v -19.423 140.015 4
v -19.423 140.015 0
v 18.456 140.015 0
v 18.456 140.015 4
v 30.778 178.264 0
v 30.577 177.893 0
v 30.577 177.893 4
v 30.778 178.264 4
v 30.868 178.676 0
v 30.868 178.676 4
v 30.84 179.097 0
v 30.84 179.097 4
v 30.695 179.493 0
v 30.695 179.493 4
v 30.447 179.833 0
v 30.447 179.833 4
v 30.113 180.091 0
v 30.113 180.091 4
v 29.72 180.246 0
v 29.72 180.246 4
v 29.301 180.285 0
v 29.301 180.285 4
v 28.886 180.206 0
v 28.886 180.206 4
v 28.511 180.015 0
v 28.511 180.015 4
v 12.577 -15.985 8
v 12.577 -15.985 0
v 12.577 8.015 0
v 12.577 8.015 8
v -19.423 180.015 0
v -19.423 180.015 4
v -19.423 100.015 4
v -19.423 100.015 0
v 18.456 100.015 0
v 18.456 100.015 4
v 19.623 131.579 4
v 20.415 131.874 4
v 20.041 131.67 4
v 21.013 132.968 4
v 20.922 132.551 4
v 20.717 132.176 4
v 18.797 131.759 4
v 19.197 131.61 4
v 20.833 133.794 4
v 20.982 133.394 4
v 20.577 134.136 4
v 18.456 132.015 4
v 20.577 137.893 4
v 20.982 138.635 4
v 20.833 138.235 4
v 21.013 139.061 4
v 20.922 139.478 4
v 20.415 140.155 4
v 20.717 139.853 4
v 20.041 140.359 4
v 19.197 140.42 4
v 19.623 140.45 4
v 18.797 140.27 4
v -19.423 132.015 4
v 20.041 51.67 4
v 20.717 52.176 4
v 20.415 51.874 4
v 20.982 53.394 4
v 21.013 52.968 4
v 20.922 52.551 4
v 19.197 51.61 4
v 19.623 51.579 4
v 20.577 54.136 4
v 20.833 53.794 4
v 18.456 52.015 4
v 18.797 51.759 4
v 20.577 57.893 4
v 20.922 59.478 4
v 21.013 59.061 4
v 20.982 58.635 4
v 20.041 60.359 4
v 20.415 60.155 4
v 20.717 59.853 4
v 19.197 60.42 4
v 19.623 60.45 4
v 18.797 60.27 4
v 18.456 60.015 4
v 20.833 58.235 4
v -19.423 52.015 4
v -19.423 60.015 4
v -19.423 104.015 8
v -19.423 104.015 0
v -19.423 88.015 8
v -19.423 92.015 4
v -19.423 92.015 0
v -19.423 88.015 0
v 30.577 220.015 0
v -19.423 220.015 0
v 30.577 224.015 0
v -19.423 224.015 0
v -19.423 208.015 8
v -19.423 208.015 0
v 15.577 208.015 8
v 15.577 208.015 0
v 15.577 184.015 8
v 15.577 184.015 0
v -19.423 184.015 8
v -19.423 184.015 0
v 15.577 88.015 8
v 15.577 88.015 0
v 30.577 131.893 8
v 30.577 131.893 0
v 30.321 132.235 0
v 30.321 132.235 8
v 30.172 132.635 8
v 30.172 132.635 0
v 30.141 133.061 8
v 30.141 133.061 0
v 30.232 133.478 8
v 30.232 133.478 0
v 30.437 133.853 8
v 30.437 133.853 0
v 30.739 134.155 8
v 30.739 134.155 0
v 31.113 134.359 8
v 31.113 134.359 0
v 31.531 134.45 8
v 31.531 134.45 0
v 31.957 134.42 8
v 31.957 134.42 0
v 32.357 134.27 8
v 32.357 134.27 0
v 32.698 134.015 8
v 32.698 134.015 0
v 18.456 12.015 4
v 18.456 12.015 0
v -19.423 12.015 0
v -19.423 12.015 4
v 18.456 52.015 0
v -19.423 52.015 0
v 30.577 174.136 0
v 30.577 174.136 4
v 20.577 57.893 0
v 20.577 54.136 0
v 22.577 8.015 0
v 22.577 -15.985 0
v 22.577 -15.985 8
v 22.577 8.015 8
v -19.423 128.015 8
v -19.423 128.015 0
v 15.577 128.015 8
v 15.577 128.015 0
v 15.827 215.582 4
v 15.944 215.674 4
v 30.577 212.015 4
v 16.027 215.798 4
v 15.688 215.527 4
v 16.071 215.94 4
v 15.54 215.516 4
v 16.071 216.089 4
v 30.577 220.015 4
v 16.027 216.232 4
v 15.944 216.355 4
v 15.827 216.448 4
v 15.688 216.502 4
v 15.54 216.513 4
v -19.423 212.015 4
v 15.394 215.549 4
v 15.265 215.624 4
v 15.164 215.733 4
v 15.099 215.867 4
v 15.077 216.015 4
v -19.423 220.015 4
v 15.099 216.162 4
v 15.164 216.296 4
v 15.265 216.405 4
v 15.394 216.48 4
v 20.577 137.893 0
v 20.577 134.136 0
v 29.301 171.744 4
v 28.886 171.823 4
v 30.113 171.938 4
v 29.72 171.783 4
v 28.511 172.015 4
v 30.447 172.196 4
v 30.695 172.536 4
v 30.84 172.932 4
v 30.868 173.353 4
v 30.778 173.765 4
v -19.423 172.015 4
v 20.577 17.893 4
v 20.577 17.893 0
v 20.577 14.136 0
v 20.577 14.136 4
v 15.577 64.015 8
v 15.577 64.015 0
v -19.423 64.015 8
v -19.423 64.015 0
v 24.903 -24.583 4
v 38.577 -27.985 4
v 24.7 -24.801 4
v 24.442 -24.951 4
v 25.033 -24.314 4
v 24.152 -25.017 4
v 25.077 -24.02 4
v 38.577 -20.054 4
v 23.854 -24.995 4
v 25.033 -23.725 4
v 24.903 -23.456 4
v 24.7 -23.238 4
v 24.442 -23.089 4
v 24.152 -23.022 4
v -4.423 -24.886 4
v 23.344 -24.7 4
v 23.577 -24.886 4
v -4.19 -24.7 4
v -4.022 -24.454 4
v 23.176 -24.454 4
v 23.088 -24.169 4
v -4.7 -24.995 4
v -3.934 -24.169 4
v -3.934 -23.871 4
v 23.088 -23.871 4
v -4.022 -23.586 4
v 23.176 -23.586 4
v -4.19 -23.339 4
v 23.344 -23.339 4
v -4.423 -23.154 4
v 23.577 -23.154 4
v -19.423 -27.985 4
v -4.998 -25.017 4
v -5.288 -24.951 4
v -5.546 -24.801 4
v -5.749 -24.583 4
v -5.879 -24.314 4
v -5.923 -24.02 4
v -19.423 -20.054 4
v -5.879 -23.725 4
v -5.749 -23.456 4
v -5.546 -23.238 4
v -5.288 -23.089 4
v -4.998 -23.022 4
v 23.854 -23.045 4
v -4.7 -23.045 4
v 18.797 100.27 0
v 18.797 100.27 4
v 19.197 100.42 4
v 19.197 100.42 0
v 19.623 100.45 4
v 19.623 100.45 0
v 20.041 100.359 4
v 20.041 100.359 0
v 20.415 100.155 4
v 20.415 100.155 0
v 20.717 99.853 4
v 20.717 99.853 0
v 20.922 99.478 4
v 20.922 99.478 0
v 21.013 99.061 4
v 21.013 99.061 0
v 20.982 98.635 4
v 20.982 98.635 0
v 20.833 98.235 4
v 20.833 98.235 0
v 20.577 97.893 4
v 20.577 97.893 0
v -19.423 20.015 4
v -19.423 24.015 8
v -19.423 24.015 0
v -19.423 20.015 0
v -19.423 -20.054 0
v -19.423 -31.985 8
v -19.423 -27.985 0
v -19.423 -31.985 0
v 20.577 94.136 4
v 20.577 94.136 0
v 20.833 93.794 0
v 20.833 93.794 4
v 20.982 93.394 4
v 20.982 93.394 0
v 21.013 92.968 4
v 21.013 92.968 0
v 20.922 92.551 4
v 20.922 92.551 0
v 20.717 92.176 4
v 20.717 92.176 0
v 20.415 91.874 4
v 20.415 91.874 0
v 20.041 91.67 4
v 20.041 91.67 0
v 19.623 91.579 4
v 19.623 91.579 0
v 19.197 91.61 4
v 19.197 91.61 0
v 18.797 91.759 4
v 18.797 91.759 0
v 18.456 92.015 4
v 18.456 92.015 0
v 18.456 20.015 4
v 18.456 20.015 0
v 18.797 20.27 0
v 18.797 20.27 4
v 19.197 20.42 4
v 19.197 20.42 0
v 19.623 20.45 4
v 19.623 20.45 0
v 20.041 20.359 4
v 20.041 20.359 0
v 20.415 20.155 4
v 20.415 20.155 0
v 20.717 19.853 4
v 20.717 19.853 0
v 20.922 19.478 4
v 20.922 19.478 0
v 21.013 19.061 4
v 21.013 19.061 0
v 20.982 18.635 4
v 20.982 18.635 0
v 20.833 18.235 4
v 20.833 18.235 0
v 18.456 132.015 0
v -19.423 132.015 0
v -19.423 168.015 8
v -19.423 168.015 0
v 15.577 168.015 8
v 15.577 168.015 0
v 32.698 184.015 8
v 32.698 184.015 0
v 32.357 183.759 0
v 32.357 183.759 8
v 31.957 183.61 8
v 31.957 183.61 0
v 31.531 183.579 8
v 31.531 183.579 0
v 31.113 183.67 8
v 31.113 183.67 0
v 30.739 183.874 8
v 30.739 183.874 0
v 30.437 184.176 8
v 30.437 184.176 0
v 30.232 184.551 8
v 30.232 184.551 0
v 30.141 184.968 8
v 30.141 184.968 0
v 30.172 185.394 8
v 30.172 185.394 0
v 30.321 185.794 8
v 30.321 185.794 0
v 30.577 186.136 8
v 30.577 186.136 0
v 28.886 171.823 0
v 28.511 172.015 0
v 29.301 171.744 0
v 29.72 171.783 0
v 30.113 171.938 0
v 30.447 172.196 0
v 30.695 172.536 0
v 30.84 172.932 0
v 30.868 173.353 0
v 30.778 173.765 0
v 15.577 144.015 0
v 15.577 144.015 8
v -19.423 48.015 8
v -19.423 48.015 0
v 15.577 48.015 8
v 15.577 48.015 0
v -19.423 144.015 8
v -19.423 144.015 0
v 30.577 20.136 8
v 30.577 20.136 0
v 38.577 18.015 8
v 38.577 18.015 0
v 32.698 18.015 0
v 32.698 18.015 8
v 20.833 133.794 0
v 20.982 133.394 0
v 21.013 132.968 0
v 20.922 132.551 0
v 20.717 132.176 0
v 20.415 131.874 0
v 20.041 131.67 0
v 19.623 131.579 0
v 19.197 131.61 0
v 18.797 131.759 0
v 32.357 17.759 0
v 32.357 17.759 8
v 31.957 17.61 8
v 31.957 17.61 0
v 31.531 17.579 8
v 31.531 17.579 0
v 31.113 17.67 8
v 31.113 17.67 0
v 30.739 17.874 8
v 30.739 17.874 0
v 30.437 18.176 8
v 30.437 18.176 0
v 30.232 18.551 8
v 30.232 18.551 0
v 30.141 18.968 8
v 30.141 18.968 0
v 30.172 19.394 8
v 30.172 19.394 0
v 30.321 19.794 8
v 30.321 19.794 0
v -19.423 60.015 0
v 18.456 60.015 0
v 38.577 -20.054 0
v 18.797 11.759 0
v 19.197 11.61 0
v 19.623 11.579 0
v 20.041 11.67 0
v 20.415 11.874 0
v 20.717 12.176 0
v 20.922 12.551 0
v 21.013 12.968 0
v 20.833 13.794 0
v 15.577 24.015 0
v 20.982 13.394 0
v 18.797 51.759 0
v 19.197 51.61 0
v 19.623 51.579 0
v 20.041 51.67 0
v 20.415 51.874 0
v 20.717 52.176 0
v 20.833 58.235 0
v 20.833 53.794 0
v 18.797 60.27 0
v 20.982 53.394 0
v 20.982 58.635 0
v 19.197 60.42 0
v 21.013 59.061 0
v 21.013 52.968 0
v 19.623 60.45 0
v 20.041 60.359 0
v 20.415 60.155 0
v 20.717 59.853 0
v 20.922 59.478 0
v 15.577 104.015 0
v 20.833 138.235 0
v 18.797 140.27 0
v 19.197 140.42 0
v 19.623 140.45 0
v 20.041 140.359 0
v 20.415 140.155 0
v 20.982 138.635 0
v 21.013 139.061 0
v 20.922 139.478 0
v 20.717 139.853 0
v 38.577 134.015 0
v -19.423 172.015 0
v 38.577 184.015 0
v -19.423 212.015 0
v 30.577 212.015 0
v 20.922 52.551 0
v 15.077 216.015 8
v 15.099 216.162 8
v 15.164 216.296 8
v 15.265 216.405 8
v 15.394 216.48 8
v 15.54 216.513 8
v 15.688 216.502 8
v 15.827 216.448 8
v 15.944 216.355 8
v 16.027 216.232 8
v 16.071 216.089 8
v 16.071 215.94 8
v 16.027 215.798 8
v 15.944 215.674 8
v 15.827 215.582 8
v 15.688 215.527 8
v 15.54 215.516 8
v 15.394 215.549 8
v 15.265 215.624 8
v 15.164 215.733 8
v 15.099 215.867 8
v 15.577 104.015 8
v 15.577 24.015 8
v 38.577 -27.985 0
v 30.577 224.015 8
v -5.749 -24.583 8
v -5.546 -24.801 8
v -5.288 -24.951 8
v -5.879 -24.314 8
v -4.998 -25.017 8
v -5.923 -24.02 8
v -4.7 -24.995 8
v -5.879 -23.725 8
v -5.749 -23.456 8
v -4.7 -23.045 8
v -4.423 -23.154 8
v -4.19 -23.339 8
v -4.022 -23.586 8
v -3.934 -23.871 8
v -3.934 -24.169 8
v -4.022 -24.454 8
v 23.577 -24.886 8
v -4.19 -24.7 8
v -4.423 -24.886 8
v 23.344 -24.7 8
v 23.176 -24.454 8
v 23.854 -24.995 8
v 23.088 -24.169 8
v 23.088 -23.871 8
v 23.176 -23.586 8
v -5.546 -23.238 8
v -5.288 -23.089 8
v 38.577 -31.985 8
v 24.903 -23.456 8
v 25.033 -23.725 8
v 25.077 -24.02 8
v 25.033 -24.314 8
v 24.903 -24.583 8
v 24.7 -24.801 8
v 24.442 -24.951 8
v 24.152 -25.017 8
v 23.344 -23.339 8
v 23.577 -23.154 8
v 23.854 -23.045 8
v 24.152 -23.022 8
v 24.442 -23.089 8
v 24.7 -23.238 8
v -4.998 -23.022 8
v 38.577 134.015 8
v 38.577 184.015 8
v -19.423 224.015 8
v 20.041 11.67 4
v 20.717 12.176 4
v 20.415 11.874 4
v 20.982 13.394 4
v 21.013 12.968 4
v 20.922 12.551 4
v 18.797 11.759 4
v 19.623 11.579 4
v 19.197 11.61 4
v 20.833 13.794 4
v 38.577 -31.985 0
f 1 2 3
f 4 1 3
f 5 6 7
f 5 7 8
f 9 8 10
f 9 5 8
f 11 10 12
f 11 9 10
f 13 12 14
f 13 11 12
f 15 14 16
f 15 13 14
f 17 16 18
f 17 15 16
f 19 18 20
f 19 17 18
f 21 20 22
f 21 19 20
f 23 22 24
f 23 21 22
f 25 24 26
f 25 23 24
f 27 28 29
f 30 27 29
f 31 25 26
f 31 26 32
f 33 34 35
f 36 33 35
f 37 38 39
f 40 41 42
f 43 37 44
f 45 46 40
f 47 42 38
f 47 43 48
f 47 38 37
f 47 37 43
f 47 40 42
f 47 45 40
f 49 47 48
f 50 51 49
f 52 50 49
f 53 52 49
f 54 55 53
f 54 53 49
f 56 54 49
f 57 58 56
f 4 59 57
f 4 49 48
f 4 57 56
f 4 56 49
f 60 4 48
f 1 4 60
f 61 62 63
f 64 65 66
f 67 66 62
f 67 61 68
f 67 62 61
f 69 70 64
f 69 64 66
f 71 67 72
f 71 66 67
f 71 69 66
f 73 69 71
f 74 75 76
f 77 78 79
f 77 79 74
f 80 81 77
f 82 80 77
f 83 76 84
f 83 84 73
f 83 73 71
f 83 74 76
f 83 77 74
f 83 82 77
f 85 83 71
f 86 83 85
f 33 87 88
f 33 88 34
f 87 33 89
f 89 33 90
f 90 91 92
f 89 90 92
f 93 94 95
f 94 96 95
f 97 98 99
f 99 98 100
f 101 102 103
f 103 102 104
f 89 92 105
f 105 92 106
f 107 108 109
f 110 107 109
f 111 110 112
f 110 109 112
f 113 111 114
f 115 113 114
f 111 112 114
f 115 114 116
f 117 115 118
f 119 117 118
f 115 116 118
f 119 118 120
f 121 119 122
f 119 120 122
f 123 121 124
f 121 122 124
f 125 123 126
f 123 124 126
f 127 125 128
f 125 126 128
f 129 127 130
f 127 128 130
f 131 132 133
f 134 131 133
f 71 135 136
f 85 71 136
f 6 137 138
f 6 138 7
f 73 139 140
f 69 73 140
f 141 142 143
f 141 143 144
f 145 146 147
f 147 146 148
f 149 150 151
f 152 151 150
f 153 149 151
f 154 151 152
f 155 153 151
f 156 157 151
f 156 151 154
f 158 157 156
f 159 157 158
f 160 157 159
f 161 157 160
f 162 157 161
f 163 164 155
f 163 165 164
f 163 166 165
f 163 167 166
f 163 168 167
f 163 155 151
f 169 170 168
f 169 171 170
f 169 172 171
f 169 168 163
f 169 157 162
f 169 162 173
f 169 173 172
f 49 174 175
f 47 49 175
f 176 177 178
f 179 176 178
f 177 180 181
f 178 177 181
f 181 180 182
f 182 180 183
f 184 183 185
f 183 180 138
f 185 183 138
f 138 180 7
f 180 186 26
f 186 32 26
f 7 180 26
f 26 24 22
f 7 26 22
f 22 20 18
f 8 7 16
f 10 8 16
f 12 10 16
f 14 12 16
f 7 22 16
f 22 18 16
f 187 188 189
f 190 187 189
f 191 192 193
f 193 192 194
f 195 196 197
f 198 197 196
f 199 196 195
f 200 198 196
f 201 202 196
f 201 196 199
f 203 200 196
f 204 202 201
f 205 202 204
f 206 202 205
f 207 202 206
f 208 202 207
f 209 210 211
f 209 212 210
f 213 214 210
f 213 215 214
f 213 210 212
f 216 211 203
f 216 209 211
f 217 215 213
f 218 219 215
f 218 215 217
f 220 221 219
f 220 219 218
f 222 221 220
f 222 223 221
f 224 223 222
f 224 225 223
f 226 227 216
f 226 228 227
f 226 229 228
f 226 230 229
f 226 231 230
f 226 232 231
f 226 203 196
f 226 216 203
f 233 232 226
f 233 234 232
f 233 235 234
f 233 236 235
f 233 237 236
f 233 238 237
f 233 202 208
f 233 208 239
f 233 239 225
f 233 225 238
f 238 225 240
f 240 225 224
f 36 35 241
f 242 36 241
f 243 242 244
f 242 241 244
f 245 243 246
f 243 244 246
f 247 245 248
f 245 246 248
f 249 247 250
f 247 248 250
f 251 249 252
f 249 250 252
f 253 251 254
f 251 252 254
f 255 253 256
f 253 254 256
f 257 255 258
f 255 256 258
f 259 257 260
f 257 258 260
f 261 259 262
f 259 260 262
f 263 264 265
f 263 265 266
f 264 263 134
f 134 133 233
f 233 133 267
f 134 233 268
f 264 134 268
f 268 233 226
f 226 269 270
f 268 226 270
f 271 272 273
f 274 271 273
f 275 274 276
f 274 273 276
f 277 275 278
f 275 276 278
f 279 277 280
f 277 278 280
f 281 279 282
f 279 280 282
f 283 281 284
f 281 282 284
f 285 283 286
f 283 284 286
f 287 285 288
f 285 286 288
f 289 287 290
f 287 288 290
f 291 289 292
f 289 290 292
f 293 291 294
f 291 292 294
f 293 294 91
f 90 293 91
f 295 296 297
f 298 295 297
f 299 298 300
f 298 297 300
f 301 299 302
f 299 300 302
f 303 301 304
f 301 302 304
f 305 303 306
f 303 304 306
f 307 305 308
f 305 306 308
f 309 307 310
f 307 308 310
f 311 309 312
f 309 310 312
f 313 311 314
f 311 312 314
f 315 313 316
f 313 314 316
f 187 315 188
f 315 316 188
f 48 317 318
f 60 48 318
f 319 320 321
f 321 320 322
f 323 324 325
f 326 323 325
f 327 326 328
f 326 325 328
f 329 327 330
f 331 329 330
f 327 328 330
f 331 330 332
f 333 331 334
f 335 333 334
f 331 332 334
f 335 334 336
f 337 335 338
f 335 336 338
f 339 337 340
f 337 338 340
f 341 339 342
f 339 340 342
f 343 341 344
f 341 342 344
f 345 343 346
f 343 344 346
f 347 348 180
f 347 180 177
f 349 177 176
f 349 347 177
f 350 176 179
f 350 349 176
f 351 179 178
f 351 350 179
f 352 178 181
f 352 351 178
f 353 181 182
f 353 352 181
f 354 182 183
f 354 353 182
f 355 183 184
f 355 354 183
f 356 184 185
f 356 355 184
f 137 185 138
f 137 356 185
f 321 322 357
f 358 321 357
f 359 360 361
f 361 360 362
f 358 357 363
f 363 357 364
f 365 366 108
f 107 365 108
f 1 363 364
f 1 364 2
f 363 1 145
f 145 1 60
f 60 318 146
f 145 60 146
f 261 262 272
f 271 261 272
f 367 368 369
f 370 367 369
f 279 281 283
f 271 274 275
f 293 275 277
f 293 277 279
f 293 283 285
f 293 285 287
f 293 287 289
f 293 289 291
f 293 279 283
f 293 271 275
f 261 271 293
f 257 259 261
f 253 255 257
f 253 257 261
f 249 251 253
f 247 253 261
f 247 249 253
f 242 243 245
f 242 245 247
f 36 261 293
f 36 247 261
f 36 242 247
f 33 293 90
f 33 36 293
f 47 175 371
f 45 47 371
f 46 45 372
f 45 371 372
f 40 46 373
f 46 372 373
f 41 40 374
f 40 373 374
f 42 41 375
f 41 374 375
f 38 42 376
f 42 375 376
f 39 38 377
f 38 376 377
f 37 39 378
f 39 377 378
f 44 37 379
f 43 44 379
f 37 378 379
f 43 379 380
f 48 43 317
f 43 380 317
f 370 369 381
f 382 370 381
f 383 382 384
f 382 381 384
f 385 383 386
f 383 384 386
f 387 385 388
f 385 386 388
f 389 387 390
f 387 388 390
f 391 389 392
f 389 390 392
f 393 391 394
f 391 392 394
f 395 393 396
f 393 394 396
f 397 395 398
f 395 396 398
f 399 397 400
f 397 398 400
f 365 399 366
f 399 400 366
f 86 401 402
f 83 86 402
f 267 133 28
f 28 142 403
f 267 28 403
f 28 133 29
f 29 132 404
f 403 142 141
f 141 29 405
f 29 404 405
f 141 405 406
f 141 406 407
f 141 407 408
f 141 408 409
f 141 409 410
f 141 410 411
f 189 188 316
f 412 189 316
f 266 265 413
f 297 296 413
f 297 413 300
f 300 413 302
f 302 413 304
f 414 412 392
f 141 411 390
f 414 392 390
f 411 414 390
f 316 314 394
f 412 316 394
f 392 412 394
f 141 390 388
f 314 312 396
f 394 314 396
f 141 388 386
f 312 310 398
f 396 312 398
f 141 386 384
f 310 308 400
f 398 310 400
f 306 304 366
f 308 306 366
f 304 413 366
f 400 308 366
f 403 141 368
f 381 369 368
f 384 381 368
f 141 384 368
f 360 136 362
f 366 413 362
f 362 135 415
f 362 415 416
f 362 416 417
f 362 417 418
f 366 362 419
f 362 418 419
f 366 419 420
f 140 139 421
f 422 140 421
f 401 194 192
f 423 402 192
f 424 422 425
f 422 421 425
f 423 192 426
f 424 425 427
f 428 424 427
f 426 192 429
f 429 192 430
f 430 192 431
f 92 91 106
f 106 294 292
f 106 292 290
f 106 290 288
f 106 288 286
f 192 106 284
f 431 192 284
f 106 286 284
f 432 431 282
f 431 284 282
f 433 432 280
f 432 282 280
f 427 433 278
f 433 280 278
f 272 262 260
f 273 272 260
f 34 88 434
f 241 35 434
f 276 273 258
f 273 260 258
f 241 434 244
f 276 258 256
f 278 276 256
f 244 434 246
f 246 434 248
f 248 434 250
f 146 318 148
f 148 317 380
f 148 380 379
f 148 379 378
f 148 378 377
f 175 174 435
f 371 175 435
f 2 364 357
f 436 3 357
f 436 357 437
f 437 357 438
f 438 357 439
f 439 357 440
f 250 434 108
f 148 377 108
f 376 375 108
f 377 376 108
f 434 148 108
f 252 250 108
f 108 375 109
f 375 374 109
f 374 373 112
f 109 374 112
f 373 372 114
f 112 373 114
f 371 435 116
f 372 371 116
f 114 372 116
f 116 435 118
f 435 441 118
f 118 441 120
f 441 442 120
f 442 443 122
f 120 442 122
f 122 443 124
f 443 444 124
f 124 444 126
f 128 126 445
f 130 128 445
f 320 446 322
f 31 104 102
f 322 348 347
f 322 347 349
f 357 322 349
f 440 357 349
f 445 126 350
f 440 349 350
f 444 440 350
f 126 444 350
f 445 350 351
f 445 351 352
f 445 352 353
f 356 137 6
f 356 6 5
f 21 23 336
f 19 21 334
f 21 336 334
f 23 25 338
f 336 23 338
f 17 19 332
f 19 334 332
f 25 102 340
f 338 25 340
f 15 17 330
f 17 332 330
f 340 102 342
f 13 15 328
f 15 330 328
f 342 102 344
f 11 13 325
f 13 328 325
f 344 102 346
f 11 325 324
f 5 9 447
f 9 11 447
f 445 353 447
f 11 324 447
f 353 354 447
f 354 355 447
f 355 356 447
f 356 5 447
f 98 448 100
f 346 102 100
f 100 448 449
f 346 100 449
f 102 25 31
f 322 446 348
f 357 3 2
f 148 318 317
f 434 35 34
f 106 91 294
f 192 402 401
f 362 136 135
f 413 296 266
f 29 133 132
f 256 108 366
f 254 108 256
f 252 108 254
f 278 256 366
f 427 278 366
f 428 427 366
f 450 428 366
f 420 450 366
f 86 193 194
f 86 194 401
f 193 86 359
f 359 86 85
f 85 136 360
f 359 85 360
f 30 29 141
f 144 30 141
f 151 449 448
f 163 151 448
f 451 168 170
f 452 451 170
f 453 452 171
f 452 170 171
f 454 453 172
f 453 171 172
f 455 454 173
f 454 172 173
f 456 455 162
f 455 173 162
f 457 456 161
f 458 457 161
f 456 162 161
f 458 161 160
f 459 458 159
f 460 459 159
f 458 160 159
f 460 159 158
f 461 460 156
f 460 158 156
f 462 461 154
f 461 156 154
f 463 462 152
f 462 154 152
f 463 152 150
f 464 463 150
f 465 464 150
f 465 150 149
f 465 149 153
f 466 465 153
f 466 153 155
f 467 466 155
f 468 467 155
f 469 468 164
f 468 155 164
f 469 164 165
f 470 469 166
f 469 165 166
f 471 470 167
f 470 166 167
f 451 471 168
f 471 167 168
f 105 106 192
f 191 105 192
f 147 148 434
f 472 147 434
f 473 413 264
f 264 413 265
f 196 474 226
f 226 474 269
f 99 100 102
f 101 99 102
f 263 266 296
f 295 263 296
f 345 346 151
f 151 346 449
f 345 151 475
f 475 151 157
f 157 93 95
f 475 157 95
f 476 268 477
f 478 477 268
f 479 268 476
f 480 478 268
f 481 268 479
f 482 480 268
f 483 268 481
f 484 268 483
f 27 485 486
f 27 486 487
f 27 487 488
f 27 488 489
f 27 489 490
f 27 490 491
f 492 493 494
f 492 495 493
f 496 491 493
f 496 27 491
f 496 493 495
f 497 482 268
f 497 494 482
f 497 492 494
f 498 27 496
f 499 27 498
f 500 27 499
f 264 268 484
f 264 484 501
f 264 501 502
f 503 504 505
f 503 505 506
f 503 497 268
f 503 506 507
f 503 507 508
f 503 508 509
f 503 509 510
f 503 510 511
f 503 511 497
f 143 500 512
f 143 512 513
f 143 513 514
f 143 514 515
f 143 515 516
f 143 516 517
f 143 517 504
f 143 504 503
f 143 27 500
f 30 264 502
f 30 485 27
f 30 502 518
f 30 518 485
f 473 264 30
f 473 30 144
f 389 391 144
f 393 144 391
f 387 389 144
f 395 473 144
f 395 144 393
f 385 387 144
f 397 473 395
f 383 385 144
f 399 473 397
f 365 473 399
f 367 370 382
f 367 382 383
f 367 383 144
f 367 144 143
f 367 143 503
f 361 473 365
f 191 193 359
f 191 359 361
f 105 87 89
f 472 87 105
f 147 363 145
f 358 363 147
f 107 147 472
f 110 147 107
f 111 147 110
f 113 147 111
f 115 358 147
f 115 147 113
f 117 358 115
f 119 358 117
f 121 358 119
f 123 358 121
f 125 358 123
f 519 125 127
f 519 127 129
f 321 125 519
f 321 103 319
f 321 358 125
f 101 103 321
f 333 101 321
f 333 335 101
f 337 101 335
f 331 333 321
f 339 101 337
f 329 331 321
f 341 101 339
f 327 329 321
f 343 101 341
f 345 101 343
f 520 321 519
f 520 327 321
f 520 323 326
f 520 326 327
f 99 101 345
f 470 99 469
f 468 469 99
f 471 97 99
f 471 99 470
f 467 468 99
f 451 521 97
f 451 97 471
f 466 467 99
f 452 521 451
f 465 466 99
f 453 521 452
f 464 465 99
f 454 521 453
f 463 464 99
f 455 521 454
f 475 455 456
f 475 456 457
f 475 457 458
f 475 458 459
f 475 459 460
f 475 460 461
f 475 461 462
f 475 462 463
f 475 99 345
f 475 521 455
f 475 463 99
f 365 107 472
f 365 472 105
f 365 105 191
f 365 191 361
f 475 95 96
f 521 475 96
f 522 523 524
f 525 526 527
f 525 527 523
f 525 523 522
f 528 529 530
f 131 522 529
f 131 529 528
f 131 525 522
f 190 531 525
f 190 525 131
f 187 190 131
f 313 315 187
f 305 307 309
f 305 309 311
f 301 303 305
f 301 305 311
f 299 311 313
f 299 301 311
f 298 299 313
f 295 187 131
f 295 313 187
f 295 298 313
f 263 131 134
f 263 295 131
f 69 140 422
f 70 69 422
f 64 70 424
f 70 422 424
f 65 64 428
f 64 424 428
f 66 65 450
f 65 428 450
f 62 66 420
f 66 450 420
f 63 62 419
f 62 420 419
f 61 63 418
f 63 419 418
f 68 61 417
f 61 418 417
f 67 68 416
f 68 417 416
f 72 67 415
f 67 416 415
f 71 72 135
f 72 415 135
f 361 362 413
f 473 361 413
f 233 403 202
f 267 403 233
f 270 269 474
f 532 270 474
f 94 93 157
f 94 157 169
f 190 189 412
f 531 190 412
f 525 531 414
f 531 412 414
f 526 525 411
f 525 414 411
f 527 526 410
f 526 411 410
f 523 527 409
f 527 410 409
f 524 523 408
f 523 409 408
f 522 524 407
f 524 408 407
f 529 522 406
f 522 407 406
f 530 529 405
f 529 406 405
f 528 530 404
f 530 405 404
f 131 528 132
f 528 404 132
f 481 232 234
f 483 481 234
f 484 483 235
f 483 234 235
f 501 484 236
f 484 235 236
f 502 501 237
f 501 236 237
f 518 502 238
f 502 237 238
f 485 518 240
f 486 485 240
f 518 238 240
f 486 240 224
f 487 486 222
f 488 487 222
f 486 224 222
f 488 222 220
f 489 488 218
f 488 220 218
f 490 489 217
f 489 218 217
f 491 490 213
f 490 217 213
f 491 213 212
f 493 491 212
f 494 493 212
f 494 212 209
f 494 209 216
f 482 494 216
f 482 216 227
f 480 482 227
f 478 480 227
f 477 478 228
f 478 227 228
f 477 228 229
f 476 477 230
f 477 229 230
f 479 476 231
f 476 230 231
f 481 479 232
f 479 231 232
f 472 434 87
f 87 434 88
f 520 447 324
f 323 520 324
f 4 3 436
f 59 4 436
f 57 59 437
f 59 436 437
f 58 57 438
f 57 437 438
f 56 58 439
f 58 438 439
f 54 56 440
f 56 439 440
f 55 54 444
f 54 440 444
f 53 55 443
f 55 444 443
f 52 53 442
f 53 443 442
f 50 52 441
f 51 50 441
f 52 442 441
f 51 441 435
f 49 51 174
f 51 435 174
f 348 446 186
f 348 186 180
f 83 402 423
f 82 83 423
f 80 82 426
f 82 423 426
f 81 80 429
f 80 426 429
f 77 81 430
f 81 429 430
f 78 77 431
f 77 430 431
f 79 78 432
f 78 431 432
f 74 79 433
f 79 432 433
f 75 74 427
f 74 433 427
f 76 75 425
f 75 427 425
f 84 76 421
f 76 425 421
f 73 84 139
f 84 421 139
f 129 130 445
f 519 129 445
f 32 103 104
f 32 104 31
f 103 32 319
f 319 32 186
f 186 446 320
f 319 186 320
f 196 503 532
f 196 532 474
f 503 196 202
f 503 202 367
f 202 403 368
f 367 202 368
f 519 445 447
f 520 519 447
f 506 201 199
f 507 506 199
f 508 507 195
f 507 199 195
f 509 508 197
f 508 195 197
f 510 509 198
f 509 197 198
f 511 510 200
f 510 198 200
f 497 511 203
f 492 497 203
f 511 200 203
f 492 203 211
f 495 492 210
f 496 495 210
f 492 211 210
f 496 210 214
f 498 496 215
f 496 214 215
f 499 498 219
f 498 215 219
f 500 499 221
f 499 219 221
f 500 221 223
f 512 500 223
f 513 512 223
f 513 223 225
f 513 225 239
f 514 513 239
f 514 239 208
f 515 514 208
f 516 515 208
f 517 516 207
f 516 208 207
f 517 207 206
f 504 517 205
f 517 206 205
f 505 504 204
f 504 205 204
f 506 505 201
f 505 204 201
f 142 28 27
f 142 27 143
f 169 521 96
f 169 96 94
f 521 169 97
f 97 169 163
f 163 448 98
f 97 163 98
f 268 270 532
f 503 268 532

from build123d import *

# Parameters (mm, degrees)
ESQUISSE1_W             = 10
ESQUISSE1_H             = 24
BOSS_EXTRU_1_DEPTH      = 8
ESQUISSE2_W             = 51.367722688
ESQUISSE2_H             = 8
ESQUISSE2_W_2           = 58
ESQUISSE2_H_2           = 7.931606273
ENL_V_MAT_EXTRU_1_DEPTH = 4
ESQUISSE3_R             = 0.5
ESQUISSE3_R_2           = 1
ENL_V_MAT_EXTRU_2_DEPTH = 4


with BuildPart() as part:
    # Esquisse1 → Boss.-Extru.1 (new body)
    with BuildSketch(Plane.XY):
        with BuildLine():
            Line((30.577007139, 186.135890651), (30.577007139, 224.014570308))
            Line((30.577007139, 224.014570308), (-19.422992861, 224.014570308))
            Line((-19.422992861, 224.014570308), (-19.422992861, 208.014570308))
            Line((-19.422992861, 208.014570308), (15.577007139, 208.014570308))
            Line((15.577007139, 208.014570308), (15.577007139, 184.014570308))
            Line((15.577007139, 184.014570308), (-19.422992861, 184.014570308))
            Line((-19.422992861, 184.014570308), (-19.422992861, 168.014570308))
            Line((-19.422992861, 168.014570308), (15.577007139, 168.014570308))
            Line((15.577007139, 168.014570308), (15.577007139, 144.014570308))
            Line((15.577007139, 144.014570308), (-19.422992861, 144.014570308))
            Line((-19.422992861, 144.014570308), (-19.422992861, 128.014570308))
            Line((-19.422992861, 128.014570308), (15.577007139, 128.014570308))
            Line((15.577007139, 128.014570308), (15.577007139, 104.014570308))
            Line((15.577007139, 104.014570308), (-19.422992861, 104.014570308))
            Line((-19.422992861, 104.014570308), (-19.422992861, 88.014570308))
            Line((-19.422992861, 88.014570308), (15.577007139, 88.014570308))
            Line((15.577007139, 88.014570308), (15.577007139, 64.014570308))
            Line((15.577007139, 64.014570308), (-19.422992861, 64.014570308))
            Line((-19.422992861, 64.014570308), (-19.422992861, 48.014570308))
            Line((-19.422992861, 48.014570308), (15.577007139, 48.014570308))
            Line((15.577007139, 48.014570308), (15.577007139, 24.014570308))
            Line((15.577007139, 24.014570308), (-19.422992861, 24.014570308))
            Line((-19.422992861, 24.014570308), (-19.422992861, -31.985429692))
            Line((-19.422992861, -31.985429692), (30.577007139, -31.985429692))
            Line((30.577007139, -31.985429692), (38.577007139, -31.985429692))
            Line((38.577007139, -31.985429692), (38.577007139, 18.014570308))
            Line((38.577007139, 18.014570308), (32.698327483, 18.014570308))
            ThreePointArc((32.698327483, 18.014570308), (30.577007139, 18.014570308), (30.577007139, 20.135890651))
            Line((30.577007139, 20.135890651), (30.577007139, 131.893249964))
            ThreePointArc((30.577007139, 131.893249964), (30.577007139, 134.014570308), (32.698327483, 134.014570308))
            Line((32.698327483, 134.014570308), (38.577007139, 134.014570308))
            Line((38.577007139, 134.014570308), (38.577007139, 184.014570308))
            Line((38.577007139, 184.014570308), (32.698327483, 184.014570308))
            ThreePointArc((32.698327483, 184.014570308), (30.577007139, 184.014570308), (30.577007139, 186.135890651))
        make_face()
        with Locations((17.577007139, -3.985429692)):
            Rectangle(ESQUISSE1_W, ESQUISSE1_H, mode=Mode.SUBTRACT)
    extrude(amount=BOSS_EXTRU_1_DEPTH)

    # Esquisse2 → Enlèv. mat.-Extru.1 (cut)
    with BuildSketch(Plane(origin=(0, 0, 0), x_dir=(-1, 0, 0), z_dir=(0, 0, -1))):
        with BuildLine():
            Line((19.422992861, 172.014570308), (-28.510535818, 172.014570308))
            ThreePointArc((-28.510535818, 172.014570308), (-30.446580511, 172.195764547), (-30.577007139, 174.135890651))
            Line((-30.577007139, 174.135890651), (-30.577007139, 177.893249964))
            ThreePointArc((-30.577007139, 177.893249964), (-30.446580511, 179.833376068), (-28.510535818, 180.014570308))
            Line((-28.510535818, 180.014570308), (19.422992861, 180.014570308))
            Line((19.422992861, 180.014570308), (19.422992861, 172.014570308))
        make_face()
        with BuildLine():
            Line((19.422992861, 140.014570308), (-18.455686796, 140.014570308))
            ThreePointArc((-18.455686796, 140.014570308), (-20.577007139, 140.014570308), (-20.577007139, 137.893249964))
            Line((-20.577007139, 137.893249964), (-20.577007139, 134.135890651))
            ThreePointArc((-20.577007139, 134.135890651), (-20.577007139, 132.014570308), (-18.455686796, 132.014570308))
            Line((-18.455686796, 132.014570308), (19.422992861, 132.014570308))
            Line((19.422992861, 132.014570308), (19.422992861, 140.014570308))
        make_face()
        with BuildLine():
            Line((19.422992861, 100.014570308), (-18.455686796, 100.014570308))
            ThreePointArc((-18.455686796, 100.014570308), (-20.577007139, 100.014570308), (-20.577007139, 97.893249964))
            Line((-20.577007139, 97.893249964), (-20.577007139, 94.135890651))
            ThreePointArc((-20.577007139, 94.135890651), (-20.577007139, 92.014570308), (-18.455686796, 92.014570308))
            Line((-18.455686796, 92.014570308), (19.422992861, 92.014570308))
            Line((19.422992861, 92.014570308), (19.422992861, 100.014570308))
        make_face()
        with BuildLine():
            Line((19.422992861, 60.014570308), (-18.455686796, 60.014570308))
            ThreePointArc((-18.455686796, 60.014570308), (-20.577007139, 60.014570308), (-20.577007139, 57.893249964))
            Line((-20.577007139, 57.893249964), (-20.577007139, 54.135890651))
            ThreePointArc((-20.577007139, 54.135890651), (-20.577007139, 52.014570308), (-18.455686796, 52.014570308))
            Line((-18.455686796, 52.014570308), (19.422992861, 52.014570308))
            Line((19.422992861, 52.014570308), (19.422992861, 60.014570308))
        make_face()
        with BuildLine():
            Line((19.422992861, 20.014570308), (-18.455686796, 20.014570308))
            ThreePointArc((-18.455686796, 20.014570308), (-20.577007139, 20.014570308), (-20.577007139, 17.893249964))
            Line((-20.577007139, 17.893249964), (-20.577007139, 14.135890651))
            ThreePointArc((-20.577007139, 14.135890651), (-20.577007139, 12.014570308), (-18.455686796, 12.014570308))
            Line((-18.455686796, 12.014570308), (19.422992861, 12.014570308))
            Line((19.422992861, 12.014570308), (19.422992861, 20.014570308))
        make_face()
        with Locations((-6.260868483, 216.014570308)):
            Rectangle(ESQUISSE2_W, ESQUISSE2_H)
        with Locations((-9.577007139, -24.019626556)):
            Rectangle(ESQUISSE2_W_2, ESQUISSE2_H_2)
    extrude(amount=-ENL_V_MAT_EXTRU_1_DEPTH, mode=Mode.SUBTRACT)

    # Esquisse3 → Enlèv. mat.-Extru.2 (cut)
    with BuildSketch(Plane(origin=(0, 0, 4), x_dir=(-1, 0, 0), z_dir=(0, 0, -1))):
        with Locations((-15.577007139, 216.014570308)):
            Circle(ESQUISSE3_R)
        with Locations((4.922992861, -24.019626556)):
            Circle(ESQUISSE3_R_2)
        with Locations(Location((-24.077007139, -24.019626556, 0), (0, 0, 180))):
            Circle(ESQUISSE3_R_2)
    extrude(amount=-ENL_V_MAT_EXTRU_2_DEPTH, mode=Mode.SUBTRACT)


solid = part.part
